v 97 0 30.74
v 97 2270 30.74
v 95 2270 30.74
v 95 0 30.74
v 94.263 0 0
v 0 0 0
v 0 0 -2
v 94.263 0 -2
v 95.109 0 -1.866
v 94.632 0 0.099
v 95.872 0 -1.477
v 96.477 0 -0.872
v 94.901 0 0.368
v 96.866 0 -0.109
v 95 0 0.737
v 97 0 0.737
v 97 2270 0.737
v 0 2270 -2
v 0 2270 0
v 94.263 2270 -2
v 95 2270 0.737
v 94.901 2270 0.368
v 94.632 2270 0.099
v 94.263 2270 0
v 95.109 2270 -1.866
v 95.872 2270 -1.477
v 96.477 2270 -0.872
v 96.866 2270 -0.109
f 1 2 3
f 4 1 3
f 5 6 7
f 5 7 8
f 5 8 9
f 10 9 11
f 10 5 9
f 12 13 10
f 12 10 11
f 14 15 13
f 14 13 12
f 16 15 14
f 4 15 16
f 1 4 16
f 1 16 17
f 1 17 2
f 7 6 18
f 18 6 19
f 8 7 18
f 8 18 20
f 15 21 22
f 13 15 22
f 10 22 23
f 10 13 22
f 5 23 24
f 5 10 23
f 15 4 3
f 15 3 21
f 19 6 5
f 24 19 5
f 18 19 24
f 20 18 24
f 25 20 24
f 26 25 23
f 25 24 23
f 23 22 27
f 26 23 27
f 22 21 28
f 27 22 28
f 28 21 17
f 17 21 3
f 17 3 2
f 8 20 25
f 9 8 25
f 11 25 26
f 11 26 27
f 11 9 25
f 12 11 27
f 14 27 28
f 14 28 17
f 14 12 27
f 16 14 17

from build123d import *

# Parameters (mm, degrees)
SZKIC1_W                           = 95
SZKIC1_H                           = 2270
ODGI_CIE_BAZOWE1_DEPTH             = 2
ODGI_CIE_KRAW_DZI1_STRIP_W         = 9.4732
ODGI_CIE_KRAW_DZI1_STRIP_H         = 2
ODGI_CIE_KRAW_DZI1_STRIP_CUT_DEPTH = 2270
ODGI_CIE_KRAW_DZI1_DEPTH           = 2270


# Sheet-metal steps are written as plain solids
with BuildPart() as part:
    # Szkic1 → Odgięcie bazowe1 (new body)
    with BuildSketch(Plane.XY):
        with Locations((47.5, 1135)):
            Rectangle(SZKIC1_W, SZKIC1_H)
    extrude(amount=-ODGI_CIE_BAZOWE1_DEPTH)

    # Odgięcie krawędzi1 strip (across the edge) → Odgięcie krawędzi1 strip cut (cut)
    with BuildSketch(Plane(origin=(95, 0, 0), x_dir=(-1, 0, 0), z_dir=(0, 1, 0))):
        with Locations((-4, -1)):
            Rectangle(ODGI_CIE_KRAW_DZI1_STRIP_W, ODGI_CIE_KRAW_DZI1_STRIP_H)
    extrude(amount=ODGI_CIE_KRAW_DZI1_STRIP_CUT_DEPTH, mode=Mode.SUBTRACT)

    # Odgięcie krawędzi1 section (across the edge) → Odgięcie krawędzi1 (add)
    with BuildSketch(Plane(origin=(95, 0, 0), x_dir=(-1, 0, 0), z_dir=(0, 1, 0))):
        with BuildLine():
            Line((-2, 0.7366), (-2, 30.74))
            Line((-2, 30.74), (0, 30.74))
            Line((0, 30.74), (0, 0.7366))
            ThreePointArc((0, 0.7366), (0.215745145, 0.215745145), (0.7366, 0))
            Line((0.7366, 0), (0.7366, -2))
            ThreePointArc((0.7366, -2), (-1.198468417, -1.198468417), (-2, 0.7366))
        make_face()
    extrude(amount=ODGI_CIE_KRAW_DZI1_DEPTH)


solid = part.part
